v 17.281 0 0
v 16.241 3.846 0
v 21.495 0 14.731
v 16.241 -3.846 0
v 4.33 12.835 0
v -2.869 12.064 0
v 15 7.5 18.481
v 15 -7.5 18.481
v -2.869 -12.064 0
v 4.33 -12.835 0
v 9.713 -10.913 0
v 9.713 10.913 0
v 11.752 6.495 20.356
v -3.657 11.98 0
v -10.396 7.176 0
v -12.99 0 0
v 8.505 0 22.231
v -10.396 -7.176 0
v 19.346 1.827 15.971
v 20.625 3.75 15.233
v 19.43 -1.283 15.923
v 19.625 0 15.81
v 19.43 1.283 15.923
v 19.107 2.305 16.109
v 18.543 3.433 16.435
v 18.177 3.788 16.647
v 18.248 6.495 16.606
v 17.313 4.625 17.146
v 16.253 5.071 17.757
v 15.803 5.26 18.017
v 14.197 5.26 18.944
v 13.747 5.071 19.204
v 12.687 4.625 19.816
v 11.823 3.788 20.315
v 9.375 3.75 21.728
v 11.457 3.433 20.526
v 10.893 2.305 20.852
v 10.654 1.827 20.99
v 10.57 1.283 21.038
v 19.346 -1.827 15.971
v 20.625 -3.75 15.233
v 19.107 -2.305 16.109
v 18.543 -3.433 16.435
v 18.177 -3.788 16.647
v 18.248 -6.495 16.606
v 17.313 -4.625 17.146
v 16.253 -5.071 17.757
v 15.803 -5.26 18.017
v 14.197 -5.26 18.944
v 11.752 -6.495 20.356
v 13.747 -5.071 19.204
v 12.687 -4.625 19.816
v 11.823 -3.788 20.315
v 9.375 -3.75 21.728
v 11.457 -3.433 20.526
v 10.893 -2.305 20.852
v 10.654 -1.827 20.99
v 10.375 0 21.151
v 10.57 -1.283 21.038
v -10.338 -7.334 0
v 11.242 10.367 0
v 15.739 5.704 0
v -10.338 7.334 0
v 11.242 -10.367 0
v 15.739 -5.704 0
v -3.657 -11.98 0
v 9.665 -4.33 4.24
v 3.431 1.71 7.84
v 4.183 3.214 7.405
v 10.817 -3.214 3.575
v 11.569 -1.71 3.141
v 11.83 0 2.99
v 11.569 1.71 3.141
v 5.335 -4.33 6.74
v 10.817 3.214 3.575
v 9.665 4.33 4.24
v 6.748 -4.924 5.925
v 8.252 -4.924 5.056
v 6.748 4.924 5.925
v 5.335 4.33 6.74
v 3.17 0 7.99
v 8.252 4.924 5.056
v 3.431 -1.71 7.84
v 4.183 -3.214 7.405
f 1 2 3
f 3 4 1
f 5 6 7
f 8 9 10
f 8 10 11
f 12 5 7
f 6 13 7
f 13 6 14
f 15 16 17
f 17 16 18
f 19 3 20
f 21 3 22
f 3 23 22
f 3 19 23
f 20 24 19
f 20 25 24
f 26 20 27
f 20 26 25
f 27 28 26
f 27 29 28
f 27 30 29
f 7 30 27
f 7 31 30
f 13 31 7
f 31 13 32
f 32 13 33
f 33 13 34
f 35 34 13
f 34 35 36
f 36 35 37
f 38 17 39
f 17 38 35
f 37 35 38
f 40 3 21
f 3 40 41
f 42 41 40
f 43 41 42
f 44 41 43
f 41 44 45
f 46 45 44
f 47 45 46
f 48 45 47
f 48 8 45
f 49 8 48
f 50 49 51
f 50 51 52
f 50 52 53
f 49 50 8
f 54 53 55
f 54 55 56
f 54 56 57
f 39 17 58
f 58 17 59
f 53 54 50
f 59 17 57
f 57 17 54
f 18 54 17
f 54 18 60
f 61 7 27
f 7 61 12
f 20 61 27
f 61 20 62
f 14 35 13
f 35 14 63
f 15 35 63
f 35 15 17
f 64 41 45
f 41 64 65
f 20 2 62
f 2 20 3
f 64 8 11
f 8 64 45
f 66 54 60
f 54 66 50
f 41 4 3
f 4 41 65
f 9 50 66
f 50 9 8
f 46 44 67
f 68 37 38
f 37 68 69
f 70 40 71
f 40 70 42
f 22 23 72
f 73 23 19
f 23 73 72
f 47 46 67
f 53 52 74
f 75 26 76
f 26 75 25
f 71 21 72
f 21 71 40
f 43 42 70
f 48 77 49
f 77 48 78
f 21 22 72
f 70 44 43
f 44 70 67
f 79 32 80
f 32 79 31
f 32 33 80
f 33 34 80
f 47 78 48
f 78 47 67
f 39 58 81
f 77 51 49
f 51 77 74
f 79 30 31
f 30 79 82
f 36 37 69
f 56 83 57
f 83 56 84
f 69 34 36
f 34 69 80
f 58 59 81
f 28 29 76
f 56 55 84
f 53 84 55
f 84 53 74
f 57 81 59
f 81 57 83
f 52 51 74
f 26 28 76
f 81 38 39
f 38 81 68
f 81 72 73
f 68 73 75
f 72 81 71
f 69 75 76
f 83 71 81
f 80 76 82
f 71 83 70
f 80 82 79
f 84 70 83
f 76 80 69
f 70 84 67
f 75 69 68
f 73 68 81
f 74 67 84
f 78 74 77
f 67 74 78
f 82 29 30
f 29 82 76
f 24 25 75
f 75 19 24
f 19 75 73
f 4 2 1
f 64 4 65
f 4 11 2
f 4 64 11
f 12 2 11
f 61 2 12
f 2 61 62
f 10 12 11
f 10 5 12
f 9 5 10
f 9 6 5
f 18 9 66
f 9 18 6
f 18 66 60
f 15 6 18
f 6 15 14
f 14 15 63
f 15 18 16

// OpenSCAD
// Customizable Bicylce Kickstand Tip
// by HarlemSquirrel

// Inside diameter in mm
inside_d = 11; //[5:25]

// Base diameter in mm
base_d = 30; //[30:60]

// Base height in mm
base_h = 30; //[30:60]

// Tilt of the kickstand in degrees
tilt = 30; //[0:45]

// Roundness of the tip in number of sides
roundness=12; //[4:64]


module inside() {
  translate([0,0,base_h-15])
  //rotate([45,0,0])
  cylinder(d1=inside_d-1, d2=inside_d, h=22);
}

module outside() {
  difference() {
    cylinder(d1=base_d, d2=inside_d+4, h=base_h, $fn=roundness, $fs=100);
  }
}

module kickstand_tip() {
  difference() {outside();
    inside();
    
  }
}

module angled_kickstand_top() {
  difference() {
    translate([0,0,-sin(tilt)*base_d/2])
    rotate([0,tilt,0])
    kickstand_tip();
    
    translate([0,0,-base_d])
    cube(base_d*2, center=true);
  }
}

angled_kickstand_top();
